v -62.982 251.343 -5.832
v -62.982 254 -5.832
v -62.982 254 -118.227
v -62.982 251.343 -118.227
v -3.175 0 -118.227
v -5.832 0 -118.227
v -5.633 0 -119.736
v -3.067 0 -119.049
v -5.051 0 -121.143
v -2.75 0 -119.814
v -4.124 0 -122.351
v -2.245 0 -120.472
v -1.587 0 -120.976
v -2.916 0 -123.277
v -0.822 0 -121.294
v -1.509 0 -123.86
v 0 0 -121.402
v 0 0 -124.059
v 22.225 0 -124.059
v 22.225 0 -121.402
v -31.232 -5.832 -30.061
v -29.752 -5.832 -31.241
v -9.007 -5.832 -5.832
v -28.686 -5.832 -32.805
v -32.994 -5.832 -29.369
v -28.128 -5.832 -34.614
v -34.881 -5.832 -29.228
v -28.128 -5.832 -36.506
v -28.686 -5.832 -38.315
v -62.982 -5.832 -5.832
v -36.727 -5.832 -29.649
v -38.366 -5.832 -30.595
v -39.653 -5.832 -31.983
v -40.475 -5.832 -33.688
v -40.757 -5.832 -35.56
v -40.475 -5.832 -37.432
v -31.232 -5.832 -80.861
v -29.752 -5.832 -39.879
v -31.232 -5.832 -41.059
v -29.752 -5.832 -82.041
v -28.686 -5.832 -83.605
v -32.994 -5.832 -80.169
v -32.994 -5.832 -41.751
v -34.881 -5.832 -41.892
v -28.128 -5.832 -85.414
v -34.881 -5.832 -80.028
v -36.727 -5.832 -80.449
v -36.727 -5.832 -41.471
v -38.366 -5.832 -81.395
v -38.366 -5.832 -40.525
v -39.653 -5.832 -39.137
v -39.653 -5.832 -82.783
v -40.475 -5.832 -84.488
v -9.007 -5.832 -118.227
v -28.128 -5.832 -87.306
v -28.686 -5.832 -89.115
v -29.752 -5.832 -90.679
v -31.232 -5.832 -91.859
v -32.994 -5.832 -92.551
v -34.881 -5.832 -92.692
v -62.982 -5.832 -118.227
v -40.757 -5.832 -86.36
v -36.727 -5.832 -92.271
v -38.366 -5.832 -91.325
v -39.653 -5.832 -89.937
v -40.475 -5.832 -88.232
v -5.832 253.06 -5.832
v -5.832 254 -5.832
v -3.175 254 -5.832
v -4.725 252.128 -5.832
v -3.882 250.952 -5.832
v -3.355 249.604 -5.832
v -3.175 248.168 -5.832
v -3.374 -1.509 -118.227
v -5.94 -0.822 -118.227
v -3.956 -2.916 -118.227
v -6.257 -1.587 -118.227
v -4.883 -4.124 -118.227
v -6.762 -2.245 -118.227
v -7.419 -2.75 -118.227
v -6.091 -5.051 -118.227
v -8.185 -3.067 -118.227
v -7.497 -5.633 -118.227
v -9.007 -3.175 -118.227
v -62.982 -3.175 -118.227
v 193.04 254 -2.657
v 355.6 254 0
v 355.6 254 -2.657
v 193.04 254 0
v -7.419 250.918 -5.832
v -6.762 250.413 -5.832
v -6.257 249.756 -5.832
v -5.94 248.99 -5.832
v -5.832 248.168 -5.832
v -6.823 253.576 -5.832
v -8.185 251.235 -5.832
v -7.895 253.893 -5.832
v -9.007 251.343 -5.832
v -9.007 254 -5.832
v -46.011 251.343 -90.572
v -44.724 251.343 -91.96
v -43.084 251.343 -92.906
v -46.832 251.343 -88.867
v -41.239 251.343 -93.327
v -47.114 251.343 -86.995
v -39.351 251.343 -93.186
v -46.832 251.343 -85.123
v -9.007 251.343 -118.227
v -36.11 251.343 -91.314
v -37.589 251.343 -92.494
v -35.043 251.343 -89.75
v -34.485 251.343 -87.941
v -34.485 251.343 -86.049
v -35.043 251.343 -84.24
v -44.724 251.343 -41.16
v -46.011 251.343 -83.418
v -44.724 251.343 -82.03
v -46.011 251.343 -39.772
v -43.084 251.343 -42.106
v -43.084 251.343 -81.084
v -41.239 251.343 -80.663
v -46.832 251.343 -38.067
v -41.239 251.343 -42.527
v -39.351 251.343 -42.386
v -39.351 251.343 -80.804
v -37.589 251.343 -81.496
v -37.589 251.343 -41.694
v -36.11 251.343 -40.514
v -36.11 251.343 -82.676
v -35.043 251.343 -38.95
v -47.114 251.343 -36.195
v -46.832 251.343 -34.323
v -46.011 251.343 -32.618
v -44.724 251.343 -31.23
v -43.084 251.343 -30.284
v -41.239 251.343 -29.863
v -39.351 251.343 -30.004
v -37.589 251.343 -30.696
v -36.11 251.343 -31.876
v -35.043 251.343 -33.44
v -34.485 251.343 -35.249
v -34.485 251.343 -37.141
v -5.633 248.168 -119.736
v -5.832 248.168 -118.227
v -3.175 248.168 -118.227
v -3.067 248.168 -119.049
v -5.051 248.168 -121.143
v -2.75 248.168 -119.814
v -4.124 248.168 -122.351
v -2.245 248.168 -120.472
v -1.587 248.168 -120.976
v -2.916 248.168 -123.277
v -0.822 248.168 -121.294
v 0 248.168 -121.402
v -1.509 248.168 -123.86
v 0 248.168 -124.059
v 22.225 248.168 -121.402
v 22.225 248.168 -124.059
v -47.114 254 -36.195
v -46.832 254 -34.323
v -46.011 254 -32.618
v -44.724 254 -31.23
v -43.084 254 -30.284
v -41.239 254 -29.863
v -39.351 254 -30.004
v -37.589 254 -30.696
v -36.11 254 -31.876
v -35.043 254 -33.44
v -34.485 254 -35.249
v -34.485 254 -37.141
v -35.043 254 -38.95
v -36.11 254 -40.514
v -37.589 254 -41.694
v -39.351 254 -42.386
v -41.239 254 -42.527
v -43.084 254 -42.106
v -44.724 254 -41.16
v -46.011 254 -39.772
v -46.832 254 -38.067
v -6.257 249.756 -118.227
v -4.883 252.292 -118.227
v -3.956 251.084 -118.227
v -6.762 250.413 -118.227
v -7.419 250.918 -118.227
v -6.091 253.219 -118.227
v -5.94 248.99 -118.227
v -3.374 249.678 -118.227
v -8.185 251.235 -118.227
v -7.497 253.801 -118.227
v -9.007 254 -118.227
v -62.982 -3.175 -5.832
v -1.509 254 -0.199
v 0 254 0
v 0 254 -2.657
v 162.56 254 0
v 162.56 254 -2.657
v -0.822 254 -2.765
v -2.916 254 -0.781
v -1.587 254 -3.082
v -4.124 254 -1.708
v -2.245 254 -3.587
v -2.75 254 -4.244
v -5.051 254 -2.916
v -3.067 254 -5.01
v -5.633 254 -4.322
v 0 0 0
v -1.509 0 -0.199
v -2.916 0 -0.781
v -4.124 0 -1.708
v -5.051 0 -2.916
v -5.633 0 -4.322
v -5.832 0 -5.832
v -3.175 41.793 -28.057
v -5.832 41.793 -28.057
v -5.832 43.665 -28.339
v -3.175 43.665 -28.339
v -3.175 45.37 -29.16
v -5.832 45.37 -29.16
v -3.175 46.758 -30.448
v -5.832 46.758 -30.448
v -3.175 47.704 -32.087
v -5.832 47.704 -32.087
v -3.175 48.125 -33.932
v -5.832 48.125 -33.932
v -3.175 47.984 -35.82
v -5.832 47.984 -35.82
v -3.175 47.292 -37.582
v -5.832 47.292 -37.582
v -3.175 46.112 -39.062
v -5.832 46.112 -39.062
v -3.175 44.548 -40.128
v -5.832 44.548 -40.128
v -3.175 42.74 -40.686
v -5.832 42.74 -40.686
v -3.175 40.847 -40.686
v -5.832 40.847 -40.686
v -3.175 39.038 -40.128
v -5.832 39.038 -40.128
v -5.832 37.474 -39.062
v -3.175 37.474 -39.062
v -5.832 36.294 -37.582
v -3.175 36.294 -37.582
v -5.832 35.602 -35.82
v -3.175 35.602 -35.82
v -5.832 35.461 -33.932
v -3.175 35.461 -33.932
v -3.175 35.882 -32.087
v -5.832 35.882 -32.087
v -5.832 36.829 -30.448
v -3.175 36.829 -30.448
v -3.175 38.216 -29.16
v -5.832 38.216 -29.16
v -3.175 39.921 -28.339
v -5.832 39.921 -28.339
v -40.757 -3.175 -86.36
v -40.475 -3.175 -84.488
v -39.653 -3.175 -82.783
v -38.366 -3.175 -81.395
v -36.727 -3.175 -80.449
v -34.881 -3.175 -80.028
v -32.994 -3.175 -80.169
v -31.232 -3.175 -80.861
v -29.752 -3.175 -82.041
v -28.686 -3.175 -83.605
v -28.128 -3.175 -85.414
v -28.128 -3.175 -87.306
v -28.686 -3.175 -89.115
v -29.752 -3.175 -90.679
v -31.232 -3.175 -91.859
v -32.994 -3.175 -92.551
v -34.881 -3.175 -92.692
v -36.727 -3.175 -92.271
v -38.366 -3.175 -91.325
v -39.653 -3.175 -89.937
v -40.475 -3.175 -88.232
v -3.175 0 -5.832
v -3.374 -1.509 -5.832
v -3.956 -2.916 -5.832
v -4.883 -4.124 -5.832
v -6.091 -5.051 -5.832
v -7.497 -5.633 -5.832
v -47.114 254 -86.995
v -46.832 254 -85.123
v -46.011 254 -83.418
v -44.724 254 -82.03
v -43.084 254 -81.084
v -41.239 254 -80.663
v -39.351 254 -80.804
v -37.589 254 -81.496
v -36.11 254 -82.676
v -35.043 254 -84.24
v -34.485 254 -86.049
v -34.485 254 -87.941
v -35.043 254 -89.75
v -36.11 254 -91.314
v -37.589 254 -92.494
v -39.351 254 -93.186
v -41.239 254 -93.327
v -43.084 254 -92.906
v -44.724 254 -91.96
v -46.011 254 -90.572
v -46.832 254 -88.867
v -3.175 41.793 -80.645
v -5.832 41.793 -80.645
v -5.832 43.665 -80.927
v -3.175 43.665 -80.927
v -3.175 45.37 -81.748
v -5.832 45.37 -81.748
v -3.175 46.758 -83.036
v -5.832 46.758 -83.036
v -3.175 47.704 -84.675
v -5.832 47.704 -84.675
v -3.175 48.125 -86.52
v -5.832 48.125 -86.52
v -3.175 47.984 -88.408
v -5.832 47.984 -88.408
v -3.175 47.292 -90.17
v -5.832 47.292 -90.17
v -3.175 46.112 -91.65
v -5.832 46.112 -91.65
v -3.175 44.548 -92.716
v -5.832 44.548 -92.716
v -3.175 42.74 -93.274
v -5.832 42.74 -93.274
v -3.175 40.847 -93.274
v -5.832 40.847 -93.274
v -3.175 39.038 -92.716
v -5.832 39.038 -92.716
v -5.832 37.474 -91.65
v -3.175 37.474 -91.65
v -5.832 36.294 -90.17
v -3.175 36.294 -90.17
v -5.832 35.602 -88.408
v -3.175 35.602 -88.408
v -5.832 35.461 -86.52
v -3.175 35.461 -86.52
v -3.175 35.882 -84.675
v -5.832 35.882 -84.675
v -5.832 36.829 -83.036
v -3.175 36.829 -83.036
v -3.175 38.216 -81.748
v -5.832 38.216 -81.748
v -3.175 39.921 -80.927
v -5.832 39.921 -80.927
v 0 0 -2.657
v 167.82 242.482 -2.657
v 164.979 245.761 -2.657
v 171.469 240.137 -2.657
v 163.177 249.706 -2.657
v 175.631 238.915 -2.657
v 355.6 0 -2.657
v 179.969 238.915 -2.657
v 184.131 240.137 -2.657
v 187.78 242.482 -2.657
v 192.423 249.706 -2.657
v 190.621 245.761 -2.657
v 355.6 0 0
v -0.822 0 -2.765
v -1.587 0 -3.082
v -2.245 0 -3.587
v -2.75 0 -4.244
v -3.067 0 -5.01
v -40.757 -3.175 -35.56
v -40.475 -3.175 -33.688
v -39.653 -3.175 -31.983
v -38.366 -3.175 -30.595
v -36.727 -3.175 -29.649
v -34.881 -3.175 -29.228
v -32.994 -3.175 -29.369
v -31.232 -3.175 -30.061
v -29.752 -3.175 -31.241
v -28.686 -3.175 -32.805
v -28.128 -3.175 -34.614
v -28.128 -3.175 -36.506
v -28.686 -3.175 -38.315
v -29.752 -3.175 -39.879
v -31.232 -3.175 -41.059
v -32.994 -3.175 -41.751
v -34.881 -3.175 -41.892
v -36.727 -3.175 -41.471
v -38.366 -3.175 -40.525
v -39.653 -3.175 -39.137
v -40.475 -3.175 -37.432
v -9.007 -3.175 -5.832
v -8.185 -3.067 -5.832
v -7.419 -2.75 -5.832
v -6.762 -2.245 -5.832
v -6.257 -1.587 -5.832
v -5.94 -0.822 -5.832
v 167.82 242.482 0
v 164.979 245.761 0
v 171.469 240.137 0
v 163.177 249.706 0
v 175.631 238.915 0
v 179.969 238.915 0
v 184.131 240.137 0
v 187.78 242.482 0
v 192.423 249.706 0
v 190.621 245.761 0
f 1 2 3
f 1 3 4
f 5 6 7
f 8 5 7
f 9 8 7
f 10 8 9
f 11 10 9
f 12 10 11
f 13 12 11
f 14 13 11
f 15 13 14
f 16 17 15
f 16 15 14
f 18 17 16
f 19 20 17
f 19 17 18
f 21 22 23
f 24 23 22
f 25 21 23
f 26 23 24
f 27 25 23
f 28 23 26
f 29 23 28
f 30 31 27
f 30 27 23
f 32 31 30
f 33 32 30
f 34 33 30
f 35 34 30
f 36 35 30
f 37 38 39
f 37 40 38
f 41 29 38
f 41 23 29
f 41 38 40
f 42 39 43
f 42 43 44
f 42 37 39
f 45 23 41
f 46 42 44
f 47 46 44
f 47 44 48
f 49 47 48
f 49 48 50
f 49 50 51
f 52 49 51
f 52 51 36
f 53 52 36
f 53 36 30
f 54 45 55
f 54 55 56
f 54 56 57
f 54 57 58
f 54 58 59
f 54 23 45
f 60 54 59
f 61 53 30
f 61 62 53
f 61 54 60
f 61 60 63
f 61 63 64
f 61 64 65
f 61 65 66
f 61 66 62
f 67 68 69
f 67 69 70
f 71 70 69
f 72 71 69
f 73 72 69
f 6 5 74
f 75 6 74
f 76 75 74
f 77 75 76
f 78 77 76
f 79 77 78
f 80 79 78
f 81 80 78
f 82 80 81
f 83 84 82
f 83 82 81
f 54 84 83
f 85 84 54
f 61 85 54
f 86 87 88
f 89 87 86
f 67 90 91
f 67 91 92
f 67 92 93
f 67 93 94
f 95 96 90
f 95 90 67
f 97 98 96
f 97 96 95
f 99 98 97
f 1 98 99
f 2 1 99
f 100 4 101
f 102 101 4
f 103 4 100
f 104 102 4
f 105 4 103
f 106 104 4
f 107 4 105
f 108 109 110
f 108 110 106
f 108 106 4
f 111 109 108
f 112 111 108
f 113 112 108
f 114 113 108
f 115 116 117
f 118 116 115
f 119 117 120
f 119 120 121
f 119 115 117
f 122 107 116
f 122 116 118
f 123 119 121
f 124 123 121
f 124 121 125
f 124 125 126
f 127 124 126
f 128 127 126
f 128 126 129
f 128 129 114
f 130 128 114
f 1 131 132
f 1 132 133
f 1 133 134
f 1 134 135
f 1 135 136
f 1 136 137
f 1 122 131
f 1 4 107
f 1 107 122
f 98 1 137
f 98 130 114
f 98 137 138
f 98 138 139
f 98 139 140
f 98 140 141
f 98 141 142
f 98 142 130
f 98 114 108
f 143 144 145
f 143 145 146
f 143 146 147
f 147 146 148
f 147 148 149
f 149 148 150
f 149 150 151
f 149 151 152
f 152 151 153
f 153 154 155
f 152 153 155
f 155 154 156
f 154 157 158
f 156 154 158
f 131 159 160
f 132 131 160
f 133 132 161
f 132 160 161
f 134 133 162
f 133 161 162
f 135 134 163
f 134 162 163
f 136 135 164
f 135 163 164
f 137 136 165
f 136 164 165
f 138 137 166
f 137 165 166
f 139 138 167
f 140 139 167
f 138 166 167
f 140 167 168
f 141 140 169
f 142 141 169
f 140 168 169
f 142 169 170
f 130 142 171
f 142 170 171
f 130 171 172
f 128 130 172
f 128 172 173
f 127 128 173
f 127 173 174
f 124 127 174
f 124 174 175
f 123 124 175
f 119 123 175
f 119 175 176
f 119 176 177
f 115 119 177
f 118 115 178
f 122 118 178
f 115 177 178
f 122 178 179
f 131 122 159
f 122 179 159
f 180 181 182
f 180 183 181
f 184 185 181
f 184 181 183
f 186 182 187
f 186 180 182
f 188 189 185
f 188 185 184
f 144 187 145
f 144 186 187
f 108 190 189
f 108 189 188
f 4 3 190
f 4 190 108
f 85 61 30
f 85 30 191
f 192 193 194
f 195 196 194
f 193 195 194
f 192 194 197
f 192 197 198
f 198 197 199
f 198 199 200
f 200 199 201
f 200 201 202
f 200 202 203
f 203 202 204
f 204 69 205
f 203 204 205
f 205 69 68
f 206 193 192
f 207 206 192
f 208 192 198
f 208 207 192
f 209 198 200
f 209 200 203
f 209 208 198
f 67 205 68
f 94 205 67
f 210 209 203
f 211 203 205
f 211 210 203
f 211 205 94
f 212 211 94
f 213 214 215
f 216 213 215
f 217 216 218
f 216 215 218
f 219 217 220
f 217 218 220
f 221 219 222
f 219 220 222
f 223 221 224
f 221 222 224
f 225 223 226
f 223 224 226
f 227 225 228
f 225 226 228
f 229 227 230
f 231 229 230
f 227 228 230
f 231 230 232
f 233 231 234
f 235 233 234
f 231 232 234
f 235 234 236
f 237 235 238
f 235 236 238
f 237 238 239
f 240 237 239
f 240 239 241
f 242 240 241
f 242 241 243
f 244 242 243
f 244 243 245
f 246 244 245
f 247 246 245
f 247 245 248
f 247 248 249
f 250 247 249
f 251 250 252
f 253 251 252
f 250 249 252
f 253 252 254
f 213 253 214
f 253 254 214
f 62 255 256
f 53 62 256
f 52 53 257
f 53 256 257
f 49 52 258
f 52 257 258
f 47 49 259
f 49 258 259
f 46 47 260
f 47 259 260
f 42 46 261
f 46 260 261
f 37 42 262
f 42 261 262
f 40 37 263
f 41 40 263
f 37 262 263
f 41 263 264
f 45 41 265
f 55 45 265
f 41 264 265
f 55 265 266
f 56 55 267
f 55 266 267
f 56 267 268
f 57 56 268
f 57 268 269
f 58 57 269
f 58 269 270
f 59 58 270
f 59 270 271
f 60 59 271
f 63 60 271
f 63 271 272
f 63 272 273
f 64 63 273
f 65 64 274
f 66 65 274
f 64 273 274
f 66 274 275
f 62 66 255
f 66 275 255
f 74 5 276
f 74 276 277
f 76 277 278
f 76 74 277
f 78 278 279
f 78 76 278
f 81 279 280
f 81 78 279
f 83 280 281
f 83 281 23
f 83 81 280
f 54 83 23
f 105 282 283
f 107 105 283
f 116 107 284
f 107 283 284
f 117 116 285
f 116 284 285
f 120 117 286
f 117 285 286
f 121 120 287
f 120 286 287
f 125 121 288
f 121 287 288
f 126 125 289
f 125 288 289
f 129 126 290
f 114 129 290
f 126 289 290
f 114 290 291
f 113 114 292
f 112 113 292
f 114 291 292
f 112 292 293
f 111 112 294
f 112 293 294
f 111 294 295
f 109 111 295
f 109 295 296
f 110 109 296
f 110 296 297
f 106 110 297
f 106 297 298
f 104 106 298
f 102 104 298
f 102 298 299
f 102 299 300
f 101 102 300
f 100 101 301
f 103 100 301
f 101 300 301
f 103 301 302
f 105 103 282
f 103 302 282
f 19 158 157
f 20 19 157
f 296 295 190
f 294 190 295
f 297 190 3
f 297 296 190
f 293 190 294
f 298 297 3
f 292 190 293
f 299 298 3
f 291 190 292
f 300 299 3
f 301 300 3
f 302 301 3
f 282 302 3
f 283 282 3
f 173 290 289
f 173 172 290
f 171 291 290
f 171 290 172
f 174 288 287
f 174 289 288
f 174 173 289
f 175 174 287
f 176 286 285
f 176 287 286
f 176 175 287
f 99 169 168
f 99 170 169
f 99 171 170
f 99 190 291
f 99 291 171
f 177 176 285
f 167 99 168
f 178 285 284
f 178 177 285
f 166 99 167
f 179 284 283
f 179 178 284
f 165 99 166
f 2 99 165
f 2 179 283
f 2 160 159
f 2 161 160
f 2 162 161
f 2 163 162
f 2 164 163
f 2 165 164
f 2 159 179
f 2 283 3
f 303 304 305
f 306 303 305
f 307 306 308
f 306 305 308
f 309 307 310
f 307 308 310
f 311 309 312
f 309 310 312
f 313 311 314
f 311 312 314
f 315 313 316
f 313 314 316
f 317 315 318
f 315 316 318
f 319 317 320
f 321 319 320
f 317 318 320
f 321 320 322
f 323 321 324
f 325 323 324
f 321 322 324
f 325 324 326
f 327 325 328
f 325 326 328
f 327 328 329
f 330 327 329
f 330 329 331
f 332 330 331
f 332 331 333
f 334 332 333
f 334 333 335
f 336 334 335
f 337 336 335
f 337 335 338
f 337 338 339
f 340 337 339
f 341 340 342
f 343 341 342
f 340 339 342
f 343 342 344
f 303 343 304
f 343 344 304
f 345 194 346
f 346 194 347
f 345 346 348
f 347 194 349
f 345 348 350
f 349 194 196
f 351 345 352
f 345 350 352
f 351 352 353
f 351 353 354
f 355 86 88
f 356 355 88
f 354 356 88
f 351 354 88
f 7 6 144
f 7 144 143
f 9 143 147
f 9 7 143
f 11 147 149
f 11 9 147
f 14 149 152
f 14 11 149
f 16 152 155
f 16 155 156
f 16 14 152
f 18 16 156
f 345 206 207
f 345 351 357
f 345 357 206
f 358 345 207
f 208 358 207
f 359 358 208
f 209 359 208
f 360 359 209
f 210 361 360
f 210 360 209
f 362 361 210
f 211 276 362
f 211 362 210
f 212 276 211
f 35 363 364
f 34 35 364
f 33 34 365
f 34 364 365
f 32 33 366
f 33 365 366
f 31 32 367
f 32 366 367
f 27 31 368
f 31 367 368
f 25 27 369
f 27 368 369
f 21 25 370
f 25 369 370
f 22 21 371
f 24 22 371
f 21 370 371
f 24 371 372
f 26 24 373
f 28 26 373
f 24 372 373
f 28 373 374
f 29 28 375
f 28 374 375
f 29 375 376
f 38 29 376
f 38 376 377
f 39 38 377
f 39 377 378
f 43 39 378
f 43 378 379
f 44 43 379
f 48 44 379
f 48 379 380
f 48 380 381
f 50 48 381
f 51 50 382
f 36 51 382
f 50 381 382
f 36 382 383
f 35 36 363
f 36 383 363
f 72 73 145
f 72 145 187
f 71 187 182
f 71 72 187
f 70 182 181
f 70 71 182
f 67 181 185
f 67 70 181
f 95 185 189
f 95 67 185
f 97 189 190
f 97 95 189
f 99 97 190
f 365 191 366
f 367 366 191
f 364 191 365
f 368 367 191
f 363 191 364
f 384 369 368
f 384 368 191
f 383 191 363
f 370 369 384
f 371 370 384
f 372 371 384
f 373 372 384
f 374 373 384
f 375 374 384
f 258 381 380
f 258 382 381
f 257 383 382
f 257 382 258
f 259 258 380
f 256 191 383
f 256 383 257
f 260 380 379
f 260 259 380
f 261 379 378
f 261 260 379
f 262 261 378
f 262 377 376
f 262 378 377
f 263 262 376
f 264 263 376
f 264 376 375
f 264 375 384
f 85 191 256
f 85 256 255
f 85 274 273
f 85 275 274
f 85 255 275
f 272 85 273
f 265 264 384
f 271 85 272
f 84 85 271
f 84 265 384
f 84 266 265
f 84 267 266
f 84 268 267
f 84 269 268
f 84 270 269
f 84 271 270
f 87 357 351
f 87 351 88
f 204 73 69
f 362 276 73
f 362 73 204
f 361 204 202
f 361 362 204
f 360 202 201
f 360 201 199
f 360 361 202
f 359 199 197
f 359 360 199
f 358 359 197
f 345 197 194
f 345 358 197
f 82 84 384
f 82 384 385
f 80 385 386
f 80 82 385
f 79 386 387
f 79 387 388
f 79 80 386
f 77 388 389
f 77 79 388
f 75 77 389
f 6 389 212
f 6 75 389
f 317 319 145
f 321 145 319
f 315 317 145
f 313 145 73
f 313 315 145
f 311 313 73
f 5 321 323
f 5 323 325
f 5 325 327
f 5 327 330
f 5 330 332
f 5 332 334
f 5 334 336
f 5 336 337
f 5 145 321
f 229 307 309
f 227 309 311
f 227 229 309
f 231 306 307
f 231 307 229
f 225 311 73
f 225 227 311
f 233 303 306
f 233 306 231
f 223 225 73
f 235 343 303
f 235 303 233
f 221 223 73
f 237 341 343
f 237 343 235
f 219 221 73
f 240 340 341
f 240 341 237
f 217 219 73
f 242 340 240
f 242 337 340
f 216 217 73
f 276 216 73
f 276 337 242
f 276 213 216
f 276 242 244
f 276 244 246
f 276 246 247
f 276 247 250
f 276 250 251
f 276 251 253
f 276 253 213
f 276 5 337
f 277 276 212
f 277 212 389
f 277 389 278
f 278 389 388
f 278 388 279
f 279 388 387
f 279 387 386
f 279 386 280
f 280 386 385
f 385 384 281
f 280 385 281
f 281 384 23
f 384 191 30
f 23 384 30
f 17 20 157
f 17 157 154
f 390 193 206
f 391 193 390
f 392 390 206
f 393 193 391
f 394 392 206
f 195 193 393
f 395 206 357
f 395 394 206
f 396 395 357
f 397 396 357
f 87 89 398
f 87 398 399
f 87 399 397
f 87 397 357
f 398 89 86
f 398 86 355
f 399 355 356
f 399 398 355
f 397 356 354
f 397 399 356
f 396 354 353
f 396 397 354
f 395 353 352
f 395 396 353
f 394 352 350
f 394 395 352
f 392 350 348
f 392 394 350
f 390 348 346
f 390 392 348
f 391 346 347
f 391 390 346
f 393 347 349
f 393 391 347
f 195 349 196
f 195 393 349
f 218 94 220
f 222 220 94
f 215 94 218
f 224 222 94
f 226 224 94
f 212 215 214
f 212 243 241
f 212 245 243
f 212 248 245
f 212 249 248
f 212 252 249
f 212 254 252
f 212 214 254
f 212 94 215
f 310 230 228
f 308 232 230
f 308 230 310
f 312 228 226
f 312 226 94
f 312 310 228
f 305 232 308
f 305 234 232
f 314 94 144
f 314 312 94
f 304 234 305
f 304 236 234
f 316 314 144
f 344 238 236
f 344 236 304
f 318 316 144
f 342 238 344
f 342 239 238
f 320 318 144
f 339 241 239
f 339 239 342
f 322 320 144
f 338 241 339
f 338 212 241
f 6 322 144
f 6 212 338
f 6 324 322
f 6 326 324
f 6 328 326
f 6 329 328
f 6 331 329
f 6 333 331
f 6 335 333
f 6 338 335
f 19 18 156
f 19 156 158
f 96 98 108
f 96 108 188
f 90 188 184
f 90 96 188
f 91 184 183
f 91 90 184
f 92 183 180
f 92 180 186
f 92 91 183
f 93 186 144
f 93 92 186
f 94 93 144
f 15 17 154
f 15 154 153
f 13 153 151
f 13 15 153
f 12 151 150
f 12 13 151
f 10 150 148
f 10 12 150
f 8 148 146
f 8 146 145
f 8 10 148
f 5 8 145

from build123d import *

# Parameters (mm, degrees)
BASE_FLANGE1_DEPTH           = 2.65684
EDGE_FLANGE1_DEPTH           = 254
EDGE_FLANGE2_STRIP_W         = 16.97736
EDGE_FLANGE2_STRIP_H         = 2.65684
EDGE_FLANGE2_STRIP_CUT_DEPTH = 112.395
EDGE_FLANGE2_DEPTH           = 112.395
EDGE_FLANGE3_DEPTH           = 112.395
EDGE_FLANGE4_DEPTH           = 248.16816
SKETCH22_R                   = 6.35
CUT_EXTRUDE1_DEPTH           = 2.65684
SKETCH23_R                   = 6.35
CUT_EXTRUDE2_DEPTH           = 2.65684
SKETCH24_R                   = 6.35
CUT_EXTRUDE3_DEPTH           = 2.65684


# Sheet-metal steps are written as plain solids
with BuildPart() as part:
    # Sketch1 → Base-Flange1 (new body)
    with BuildSketch(Plane.XY):
        with BuildLine():
            Line((0, 0), (355.6, 0))
            Line((355.6, 0), (355.6, 254))
            Line((355.6, 254), (193.04, 254))
            ThreePointArc((193.04, 254), (177.8, 238.76), (162.56, 254))
            Line((162.56, 254), (0, 254))
            Line((0, 254), (0, 0))
        make_face()
    extrude(amount=-BASE_FLANGE1_DEPTH)

    # Edge-Flange1 section (across the edge) → Edge-Flange1 (add)
    with BuildSketch(Plane(origin=(-3.175, 0, -2.65684), x_dir=(1, 0, 0), z_dir=(0, 1, 0))):
        with BuildLine():
            Line((-2.65684, 3.175), (-2.65684, 115.57))
            Line((-2.65684, 115.57), (0, 115.57))
            Line((0, 115.57), (0, 3.175))
            ThreePointArc((0, 3.175), (0.92993597, 0.92993597), (3.175, 0))
            Line((3.175, 0), (3.175, -2.65684))
            ThreePointArc((3.175, -2.65684), (-0.948733611, -0.948733611), (-2.65684, 3.175))
        make_face()
    extrude(amount=EDGE_FLANGE1_DEPTH)

    # Edge-Flange2 strip (across the edge) → Edge-Flange2 strip cut (cut)
    with BuildSketch(Plane(origin=(-5.83184, 254, -5.83184), x_dir=(0, -1, 0), z_dir=(0, 0, -1))):
        with Locations((-2.65684, -1.32842)):
            Rectangle(EDGE_FLANGE2_STRIP_W, EDGE_FLANGE2_STRIP_H)
    extrude(amount=EDGE_FLANGE2_STRIP_CUT_DEPTH, mode=Mode.SUBTRACT)

    # Edge-Flange2 section (across the edge) → Edge-Flange2 (add)
    with BuildSketch(Plane(origin=(-5.83184, 254, -5.83184), x_dir=(0, -1, 0), z_dir=(0, 0, -1))):
        with BuildLine():
            Line((0, 3.175), (0, 57.15))
            Line((0, 57.15), (2.65684, 57.15))
            Line((2.65684, 57.15), (2.65684, 3.175))
            ThreePointArc((2.65684, 3.175), (3.58677597, 0.92993597), (5.83184, 0))
            Line((5.83184, 0), (5.83184, -2.65684))
            ThreePointArc((5.83184, -2.65684), (1.708106389, -0.948733611), (0, 3.175))
        make_face()
    extrude(amount=EDGE_FLANGE2_DEPTH)

    # Edge-Flange3 section (across the edge) → Edge-Flange3 (add)
    with BuildSketch(Plane(origin=(-5.83184, -3.175, -118.22684), x_dir=(0, 1, 0), z_dir=(0, 0, 1))):
        with BuildLine():
            Line((-2.65684, 3.175), (-2.65684, 57.15))
            Line((-2.65684, 57.15), (0, 57.15))
            Line((0, 57.15), (0, 3.175))
            ThreePointArc((0, 3.175), (0.92993597, 0.92993597), (3.175, 0))
            Line((3.175, 0), (3.175, -2.65684))
            ThreePointArc((3.175, -2.65684), (-0.948733611, -0.948733611), (-2.65684, 3.175))
        make_face()
    extrude(amount=EDGE_FLANGE3_DEPTH)

    # Edge-Flange4 section (across the edge) → Edge-Flange4 (add)
    with BuildSketch(Plane(origin=(-3.175, 0, -121.40184), x_dir=(0, 0, 1), z_dir=(0, 1, 0))):
        with BuildLine():
            Line((-2.65684, 3.175), (-2.65684, 25.4))
            Line((-2.65684, 25.4), (0, 25.4))
            Line((0, 25.4), (0, 3.175))
            ThreePointArc((0, 3.175), (0.92993597, 0.92993597), (3.175, 0))
            Line((3.175, 0), (3.175, -2.65684))
            ThreePointArc((3.175, -2.65684), (-0.948733611, -0.948733611), (-2.65684, 3.175))
        make_face()
    extrude(amount=EDGE_FLANGE4_DEPTH)

    # Sketch22 → Cut-Extrude1 (cut)
    with BuildSketch(Plane(origin=(0, 254, 0), x_dir=(1, 0, 0), z_dir=(0, 1, 0))):
        with Locations(Location((-40.76446, 86.995, 0), (0, 0, 180))):
            Circle(SKETCH22_R)
        with Locations(Location((-40.76446, 36.195, 0), (0, 0, 180))):
            Circle(SKETCH22_R)
    extrude(amount=-CUT_EXTRUDE1_DEPTH, mode=Mode.SUBTRACT)

    # Sketch23 → Cut-Extrude2 (cut)
    with BuildSketch(Plane(origin=(0, -3.175, 0), x_dir=(1, 0, 0), z_dir=(0, 1, 0))):
        with Locations(Location((-34.40684, 86.36, 0), (0, 0, 180))):
            Circle(SKETCH23_R)
        with Locations(Location((-34.40684, 35.56, 0), (0, 0, 180))):
            Circle(SKETCH23_R)
    extrude(amount=-CUT_EXTRUDE2_DEPTH, mode=Mode.SUBTRACT)

    # Sketch24 → Cut-Extrude3 (cut)
    with BuildSketch(Plane.ZY.offset(5.83184)):
        with Locations((-86.995, 41.79316)):
            Circle(SKETCH24_R)
        with Locations((-34.40684, 41.79316)):
            Circle(SKETCH24_R)
    extrude(amount=-CUT_EXTRUDE3_DEPTH, mode=Mode.SUBTRACT)


solid = part.part
